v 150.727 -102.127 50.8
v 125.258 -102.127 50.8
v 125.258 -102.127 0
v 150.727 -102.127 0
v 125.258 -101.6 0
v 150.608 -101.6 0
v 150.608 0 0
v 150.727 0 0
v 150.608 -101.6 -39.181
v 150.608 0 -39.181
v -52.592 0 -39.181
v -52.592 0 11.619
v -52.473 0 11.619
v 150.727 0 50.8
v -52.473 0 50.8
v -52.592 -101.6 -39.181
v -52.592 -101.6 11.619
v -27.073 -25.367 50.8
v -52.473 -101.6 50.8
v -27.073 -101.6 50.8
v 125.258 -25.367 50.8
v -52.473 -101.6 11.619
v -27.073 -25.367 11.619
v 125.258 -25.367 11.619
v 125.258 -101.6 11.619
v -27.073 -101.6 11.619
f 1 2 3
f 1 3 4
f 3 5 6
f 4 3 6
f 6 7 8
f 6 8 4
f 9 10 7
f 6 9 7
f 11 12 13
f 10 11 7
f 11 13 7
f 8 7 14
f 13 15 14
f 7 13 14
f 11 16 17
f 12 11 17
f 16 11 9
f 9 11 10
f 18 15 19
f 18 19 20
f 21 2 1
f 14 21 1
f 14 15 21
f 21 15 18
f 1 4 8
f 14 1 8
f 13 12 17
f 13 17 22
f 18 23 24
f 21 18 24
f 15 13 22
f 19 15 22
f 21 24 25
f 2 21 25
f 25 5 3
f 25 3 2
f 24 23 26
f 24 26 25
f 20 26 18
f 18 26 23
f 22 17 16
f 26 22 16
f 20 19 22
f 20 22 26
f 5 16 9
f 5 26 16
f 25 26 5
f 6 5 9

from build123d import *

# Parameters (mm, degrees)
F0_W     = 203.2
F0_H     = 50.8
F1_DEPTH = 101.6
F2_W     = 25.4
F2_H     = 25.3674704581
F2_W_2   = 152.3310508887
F2_H_2   = 76.2325295419
F2_W_3   = 0.2561658621
F2_W_4   = 25.2127832492
F2_H_3   = 0.0325295419
F3_DEPTH = 50.8


with BuildPart() as f1:
    # F0 (on Front) → F1 (new body)
    with BuildSketch(Plane.XZ):
        with Locations((49.0080691226, -13.7808406726)):
            Rectangle(F0_W, F0_H)
    extrude(amount=F1_DEPTH)

    # F2 (on Top) → F3 (join)
    with BuildSketch(Plane.XY):
        with Locations((-39.7728137652, -12.6837352291)):
            Rectangle(F2_W, F2_H)
        with Locations((49.0927116791, -12.6837352291)):
            Rectangle(F2_W_2, F2_H)
        with Locations((-39.7728137652, -63.4837352291)):
            Rectangle(F2_W, F2_H_2)
        with Locations((125.3863200545, -12.6837352291)):
            Rectangle(F2_W_3, F2_H)
        Polygon((125.5144029856, -25.3674704581), (125.2582371235, -25.3674704581), (125.2582371235, -102.1268442273), (150.7271862348, -102.1268442273), (150.7271862348, -25.4), (125.5144029856, -25.4), align=None)
        with Locations((138.1207946102, -12.6837352291)):
            Rectangle(F2_W_4, F2_H)
        with Locations((138.1207946102, -25.3837352291)):
            Rectangle(F2_W_4, F2_H_3)
    extrude(amount=F3_DEPTH)


solid = f1.part
